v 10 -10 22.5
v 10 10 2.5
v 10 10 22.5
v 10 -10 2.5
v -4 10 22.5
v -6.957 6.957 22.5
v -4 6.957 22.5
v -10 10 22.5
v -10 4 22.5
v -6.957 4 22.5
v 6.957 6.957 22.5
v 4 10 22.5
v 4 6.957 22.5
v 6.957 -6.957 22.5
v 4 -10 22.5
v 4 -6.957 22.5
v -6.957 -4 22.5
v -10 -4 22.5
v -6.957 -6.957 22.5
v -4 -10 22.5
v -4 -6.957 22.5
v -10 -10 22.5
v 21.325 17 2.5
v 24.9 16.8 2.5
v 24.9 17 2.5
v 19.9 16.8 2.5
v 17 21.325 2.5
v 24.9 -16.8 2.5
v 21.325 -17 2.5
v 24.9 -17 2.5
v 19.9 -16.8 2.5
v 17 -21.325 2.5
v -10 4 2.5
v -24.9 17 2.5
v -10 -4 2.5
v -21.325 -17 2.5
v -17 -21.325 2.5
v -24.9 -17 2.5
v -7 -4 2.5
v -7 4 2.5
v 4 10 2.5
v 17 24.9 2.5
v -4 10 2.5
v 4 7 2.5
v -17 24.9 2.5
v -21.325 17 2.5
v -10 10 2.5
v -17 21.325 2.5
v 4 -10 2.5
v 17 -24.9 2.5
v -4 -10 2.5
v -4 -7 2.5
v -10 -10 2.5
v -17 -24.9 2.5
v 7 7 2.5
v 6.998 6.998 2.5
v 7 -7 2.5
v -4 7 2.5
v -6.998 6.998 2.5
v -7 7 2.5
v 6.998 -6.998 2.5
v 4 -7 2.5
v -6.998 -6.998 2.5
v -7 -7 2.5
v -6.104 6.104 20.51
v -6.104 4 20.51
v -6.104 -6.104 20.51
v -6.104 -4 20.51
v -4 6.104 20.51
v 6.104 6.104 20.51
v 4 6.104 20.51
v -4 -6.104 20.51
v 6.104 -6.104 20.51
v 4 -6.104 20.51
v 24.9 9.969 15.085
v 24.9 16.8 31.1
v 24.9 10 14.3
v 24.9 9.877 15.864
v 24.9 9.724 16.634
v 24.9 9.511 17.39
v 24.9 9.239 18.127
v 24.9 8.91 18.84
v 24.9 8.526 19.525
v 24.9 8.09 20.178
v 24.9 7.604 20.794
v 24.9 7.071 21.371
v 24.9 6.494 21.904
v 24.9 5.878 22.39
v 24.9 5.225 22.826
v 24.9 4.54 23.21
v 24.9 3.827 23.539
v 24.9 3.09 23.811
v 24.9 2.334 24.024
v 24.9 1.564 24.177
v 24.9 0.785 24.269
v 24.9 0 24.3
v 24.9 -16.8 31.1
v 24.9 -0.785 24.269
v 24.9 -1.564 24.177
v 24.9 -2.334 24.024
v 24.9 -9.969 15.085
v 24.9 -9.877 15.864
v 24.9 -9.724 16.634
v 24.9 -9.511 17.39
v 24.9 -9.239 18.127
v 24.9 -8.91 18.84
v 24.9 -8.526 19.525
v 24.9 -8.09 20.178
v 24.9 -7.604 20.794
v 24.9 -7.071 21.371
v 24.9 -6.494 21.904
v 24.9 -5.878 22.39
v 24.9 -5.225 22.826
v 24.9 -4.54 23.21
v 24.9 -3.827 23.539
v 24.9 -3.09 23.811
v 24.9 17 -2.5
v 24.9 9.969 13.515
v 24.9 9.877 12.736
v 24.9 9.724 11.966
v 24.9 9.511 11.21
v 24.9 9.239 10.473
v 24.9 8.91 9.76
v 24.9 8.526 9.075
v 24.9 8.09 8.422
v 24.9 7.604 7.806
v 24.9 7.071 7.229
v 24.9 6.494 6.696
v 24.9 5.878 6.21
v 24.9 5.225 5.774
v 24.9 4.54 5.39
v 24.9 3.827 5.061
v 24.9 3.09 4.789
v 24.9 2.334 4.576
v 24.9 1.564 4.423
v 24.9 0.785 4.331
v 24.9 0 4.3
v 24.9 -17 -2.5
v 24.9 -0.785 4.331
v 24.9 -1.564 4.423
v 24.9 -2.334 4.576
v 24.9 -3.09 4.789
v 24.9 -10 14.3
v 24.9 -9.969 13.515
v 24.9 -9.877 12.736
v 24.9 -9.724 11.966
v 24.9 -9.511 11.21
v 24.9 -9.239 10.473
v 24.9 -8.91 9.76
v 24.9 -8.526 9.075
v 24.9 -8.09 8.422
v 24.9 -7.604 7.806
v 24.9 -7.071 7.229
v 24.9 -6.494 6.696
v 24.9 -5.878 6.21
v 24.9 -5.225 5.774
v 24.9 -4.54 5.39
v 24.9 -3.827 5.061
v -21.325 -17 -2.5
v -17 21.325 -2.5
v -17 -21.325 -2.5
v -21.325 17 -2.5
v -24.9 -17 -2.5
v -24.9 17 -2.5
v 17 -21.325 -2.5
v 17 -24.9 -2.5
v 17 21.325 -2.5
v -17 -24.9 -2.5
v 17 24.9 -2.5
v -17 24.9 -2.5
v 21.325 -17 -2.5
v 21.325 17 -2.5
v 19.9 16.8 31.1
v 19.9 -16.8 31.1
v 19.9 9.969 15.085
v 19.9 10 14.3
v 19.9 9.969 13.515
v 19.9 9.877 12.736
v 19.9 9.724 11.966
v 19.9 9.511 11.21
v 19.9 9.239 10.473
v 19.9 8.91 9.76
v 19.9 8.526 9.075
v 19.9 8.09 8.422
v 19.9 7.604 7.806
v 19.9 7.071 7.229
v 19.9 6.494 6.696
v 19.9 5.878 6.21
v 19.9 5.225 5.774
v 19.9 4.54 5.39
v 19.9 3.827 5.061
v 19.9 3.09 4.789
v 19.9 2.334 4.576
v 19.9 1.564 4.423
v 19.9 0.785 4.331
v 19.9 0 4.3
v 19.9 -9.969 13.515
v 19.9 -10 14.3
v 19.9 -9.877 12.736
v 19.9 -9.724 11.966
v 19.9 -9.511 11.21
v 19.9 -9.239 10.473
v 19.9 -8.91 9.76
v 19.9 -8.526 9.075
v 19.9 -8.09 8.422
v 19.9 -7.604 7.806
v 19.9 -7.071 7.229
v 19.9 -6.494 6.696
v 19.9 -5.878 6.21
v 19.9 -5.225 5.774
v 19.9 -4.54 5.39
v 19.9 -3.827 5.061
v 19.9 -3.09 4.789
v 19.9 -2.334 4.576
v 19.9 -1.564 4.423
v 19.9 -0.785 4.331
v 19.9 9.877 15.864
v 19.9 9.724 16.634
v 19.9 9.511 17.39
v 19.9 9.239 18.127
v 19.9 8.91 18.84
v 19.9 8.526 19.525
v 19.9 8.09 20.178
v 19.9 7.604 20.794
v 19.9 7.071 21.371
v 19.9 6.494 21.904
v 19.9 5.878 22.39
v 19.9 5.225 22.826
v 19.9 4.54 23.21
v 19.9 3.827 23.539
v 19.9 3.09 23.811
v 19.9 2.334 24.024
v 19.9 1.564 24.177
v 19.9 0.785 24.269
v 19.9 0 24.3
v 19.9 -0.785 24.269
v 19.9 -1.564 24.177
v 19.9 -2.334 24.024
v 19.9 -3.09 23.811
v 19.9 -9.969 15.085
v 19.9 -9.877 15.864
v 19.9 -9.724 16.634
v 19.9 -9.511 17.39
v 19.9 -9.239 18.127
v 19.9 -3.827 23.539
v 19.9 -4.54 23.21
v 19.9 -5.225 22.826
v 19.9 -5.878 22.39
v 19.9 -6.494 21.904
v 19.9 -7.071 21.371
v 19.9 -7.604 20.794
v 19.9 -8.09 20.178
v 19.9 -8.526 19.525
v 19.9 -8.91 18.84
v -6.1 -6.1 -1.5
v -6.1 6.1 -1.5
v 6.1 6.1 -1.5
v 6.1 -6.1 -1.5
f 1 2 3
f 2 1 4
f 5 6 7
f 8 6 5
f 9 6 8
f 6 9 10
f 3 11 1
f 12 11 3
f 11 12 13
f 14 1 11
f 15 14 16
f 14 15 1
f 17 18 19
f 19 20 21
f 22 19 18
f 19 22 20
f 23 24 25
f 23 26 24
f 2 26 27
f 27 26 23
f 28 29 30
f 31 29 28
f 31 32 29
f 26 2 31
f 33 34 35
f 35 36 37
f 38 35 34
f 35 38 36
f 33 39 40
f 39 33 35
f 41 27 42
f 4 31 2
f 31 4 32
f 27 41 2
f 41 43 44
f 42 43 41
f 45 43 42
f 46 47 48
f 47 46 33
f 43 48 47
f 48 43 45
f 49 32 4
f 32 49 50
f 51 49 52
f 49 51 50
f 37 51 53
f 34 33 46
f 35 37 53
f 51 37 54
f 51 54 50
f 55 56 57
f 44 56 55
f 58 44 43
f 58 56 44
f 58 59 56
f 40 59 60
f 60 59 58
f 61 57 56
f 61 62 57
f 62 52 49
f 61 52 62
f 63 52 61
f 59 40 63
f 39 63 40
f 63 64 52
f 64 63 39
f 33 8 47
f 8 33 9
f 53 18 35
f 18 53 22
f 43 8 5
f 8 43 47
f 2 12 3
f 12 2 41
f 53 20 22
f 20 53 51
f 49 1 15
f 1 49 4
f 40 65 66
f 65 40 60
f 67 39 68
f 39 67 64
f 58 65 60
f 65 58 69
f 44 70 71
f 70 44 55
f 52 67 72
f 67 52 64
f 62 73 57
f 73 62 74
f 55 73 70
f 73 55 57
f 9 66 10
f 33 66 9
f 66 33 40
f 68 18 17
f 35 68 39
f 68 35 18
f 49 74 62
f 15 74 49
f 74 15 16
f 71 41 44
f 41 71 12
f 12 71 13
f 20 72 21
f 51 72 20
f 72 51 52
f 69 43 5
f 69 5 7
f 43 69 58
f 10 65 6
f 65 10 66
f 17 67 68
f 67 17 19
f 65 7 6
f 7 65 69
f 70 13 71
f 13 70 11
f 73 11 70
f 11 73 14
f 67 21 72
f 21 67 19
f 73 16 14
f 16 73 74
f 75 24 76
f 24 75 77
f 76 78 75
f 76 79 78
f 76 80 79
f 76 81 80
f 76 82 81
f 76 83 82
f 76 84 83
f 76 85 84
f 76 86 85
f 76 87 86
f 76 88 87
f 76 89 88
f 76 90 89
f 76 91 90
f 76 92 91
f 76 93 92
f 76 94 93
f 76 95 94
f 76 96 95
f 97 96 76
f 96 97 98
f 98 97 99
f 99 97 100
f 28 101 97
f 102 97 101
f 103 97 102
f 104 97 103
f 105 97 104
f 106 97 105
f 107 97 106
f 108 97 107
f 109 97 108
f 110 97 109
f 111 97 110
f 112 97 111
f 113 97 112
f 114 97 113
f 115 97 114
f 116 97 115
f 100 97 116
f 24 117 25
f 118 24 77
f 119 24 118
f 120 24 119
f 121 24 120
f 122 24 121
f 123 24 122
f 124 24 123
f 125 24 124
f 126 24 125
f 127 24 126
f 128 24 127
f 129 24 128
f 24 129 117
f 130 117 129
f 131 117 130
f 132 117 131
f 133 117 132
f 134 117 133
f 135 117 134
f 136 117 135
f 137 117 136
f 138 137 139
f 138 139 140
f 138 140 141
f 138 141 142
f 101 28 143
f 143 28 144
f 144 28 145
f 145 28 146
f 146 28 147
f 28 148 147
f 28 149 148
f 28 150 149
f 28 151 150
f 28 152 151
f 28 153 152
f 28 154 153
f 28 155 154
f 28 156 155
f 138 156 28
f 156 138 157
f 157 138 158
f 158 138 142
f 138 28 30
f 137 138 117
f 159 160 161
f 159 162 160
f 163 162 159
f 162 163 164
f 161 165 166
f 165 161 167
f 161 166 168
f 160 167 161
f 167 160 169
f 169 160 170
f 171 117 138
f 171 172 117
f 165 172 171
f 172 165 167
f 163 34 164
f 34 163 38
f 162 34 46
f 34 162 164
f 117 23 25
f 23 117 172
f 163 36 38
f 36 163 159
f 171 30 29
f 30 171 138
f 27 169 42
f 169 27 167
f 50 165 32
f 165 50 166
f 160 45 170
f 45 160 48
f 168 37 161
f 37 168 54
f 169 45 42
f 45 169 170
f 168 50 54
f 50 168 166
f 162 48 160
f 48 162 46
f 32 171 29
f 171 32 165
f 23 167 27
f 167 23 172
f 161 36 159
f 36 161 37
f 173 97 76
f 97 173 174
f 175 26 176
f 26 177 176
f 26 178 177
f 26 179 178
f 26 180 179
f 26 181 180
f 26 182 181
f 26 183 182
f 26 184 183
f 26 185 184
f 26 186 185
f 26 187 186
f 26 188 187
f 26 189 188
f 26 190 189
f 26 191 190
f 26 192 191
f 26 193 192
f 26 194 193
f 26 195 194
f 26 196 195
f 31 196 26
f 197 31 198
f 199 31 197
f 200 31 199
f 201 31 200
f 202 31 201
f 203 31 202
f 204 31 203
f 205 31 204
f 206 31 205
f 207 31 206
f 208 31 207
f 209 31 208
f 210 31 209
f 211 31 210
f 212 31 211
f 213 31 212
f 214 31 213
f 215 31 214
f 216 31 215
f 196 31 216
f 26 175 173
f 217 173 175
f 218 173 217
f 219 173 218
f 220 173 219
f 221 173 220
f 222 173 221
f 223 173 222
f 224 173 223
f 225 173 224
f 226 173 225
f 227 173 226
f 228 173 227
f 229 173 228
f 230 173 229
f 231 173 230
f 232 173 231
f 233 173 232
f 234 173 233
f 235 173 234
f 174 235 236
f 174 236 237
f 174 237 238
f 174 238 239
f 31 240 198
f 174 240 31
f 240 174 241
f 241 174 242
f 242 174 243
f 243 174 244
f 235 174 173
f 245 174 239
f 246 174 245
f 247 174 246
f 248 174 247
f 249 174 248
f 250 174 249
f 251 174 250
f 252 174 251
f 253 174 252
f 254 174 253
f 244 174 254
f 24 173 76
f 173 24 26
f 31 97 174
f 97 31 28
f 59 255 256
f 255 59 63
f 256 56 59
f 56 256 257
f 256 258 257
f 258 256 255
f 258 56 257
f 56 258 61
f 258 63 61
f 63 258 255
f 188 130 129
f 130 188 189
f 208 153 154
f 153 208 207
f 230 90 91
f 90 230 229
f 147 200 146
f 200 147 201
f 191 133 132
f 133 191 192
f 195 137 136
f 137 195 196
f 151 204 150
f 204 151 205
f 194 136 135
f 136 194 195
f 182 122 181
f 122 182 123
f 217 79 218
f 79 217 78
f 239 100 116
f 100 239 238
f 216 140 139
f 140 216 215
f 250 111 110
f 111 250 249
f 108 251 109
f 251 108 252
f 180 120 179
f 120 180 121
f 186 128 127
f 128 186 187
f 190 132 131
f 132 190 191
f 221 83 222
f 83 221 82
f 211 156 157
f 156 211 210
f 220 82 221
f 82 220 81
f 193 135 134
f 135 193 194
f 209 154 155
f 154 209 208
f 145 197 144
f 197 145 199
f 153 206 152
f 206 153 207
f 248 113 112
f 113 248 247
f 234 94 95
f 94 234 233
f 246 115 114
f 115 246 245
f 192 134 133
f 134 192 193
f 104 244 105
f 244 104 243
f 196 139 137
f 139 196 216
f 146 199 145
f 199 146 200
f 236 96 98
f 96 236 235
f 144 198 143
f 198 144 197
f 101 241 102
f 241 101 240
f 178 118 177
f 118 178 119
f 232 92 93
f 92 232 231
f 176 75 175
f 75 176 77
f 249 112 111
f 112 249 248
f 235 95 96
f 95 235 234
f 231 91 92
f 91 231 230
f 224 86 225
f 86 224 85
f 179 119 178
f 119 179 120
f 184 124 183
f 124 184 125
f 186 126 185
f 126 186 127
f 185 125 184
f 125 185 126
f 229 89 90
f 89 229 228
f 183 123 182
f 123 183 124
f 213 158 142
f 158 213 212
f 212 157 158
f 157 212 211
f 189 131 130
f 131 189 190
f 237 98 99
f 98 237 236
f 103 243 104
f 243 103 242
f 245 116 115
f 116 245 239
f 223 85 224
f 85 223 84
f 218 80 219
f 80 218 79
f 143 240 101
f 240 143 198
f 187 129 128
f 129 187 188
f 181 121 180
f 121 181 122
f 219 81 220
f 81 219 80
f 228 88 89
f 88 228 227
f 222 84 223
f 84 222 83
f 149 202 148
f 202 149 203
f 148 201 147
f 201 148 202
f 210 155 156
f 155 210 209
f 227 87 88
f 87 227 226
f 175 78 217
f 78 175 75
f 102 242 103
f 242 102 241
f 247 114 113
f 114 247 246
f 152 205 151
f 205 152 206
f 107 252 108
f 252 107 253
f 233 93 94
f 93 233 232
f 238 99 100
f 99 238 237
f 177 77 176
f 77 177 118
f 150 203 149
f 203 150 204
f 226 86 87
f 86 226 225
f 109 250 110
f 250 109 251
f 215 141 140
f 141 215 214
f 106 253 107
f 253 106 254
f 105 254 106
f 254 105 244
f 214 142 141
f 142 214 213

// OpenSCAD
//Cube insert: Perpendicular 


/* [Hiden] */
$fn = 80;
eps = .002;
a = 49.8;
b = 33.6;
c = 6.28;
d = 53.8;
h = 5;

tol = 0.1;

l_cuv = 12;
w_cuv = 12;
h_cuv = 30;
dist_cuv = 1;
z_cuv = -4;

l_therm = 3-tol;
h_therm = 20;
w_therm = 20;

l_holder = 20;
w_holder = 20;
h_holder = 20;
l_frame = 3;
l_pin = 2;

l_lum = 5;
r_lum = 10;

h_open = 18;

h_top = h_holder-h_open;

IM_offset = 0.2;



insert();

module trunc_pyramid(la, wa, lb, wb, h) {
    la = la / 2;
    wa = wa / 2;
    lb = lb / 2;
    wb = wb / 2;

    polyhedron(
        points=[
            // bottom
            [ la,  wa, 0],   // 0
            [ la, -wa, 0],   // 1
            [-la, -wa, 0],   // 2
            [-la,  wa, 0],   // 3

            // top
            [ lb,  wb, h],   // 4
            [ lb, -wb, h],   // 5
            [-lb, -wb, h],   // 6
            [-lb,  wb, h]    // 7
        ],

        faces=[
            // bottom (außen zeigt nach -Z, also CCW von unten)
            [0,2,1],
            [0,3,2],

            // top (außen zeigt nach +Z, also CCW von oben)
            [4,6,7],
            [4,5,6],

            // sides (alle CCW von außen)
            [0,1,5], [0,5,4],
            [1,2,6], [1,6,5],
            [2,3,7], [2,7,6],
            [3,0,4], [3,4,7]
        ],

        convexity = 20
    );
}



module insert() {
    //translate([-l_cuv/2,-w_cuv/2,h/2]) {%cube([l_cuv, w_cuv, h_cuv]); }

    translate([-a/2,-w_therm/2,h/2]) {color([0,0,1]) %cube([l_therm, w_therm, h_therm]); };
  
    difference() {
    translate([-l_holder/2,-w_holder/2,h/2]) {cube([l_holder, w_holder, h_holder]); }
    
    
    translate([0,0,h/2]) {trunc_pyramid(l_cuv+2*dist_cuv, w_cuv+2*dist_cuv, l_cuv+2*tol, w_cuv+2*tol, h_holder-h_top+tol); }
  


    
    translate([-dist_cuv-l_holder/2,l_pin-w_cuv/2,h/2]) {cube([l_holder/2+2*dist_cuv, w_cuv-2*l_pin, h_holder+tol]); }
    translate([l_pin-l_cuv/2,-dist_cuv-w_holder/2,h/2]) {cube([l_cuv-2*l_pin, w_holder+dist_cuv*2, h_holder+tol]); }
    
    
    translate([0,0,h/2+h_holder-h_top]) {trunc_pyramid(l_cuv+2*tol, w_cuv+2*tol, l_cuv+2*dist_cuv, w_cuv+2*dist_cuv, h_top+tol);}

    
    }

    difference() {
        union() {   //basic insert design
                cube([a,b+2*IM_offset,h], center=true);
                cube([b+2*IM_offset,a,h], center=true);
                rotate(a=[0,0,45]){
                    cube([c,d+2*IM_offset,h], center=true);
                }
                rotate(a=[0,0,-45]){
                    cube([c,d+2*IM_offset,h], center=true);
                }
                translate([a/2-l_lum,-b/2,-h/2]) { cube([l_lum, b, b]); };

            }
        
        translate([0,0,h/2+z_cuv]) {trunc_pyramid(l_cuv+2*tol, w_cuv+2*tol, l_cuv+2*dist_cuv, w_cuv+2*dist_cuv, -z_cuv+0.01);}
        translate([a/2-l_lum-0.01,0,b/2-h/2]) rotate(a=[0,90,0]) cylinder(h=l_lum+0.02, r=r_lum);
    
        
        
        }
}
